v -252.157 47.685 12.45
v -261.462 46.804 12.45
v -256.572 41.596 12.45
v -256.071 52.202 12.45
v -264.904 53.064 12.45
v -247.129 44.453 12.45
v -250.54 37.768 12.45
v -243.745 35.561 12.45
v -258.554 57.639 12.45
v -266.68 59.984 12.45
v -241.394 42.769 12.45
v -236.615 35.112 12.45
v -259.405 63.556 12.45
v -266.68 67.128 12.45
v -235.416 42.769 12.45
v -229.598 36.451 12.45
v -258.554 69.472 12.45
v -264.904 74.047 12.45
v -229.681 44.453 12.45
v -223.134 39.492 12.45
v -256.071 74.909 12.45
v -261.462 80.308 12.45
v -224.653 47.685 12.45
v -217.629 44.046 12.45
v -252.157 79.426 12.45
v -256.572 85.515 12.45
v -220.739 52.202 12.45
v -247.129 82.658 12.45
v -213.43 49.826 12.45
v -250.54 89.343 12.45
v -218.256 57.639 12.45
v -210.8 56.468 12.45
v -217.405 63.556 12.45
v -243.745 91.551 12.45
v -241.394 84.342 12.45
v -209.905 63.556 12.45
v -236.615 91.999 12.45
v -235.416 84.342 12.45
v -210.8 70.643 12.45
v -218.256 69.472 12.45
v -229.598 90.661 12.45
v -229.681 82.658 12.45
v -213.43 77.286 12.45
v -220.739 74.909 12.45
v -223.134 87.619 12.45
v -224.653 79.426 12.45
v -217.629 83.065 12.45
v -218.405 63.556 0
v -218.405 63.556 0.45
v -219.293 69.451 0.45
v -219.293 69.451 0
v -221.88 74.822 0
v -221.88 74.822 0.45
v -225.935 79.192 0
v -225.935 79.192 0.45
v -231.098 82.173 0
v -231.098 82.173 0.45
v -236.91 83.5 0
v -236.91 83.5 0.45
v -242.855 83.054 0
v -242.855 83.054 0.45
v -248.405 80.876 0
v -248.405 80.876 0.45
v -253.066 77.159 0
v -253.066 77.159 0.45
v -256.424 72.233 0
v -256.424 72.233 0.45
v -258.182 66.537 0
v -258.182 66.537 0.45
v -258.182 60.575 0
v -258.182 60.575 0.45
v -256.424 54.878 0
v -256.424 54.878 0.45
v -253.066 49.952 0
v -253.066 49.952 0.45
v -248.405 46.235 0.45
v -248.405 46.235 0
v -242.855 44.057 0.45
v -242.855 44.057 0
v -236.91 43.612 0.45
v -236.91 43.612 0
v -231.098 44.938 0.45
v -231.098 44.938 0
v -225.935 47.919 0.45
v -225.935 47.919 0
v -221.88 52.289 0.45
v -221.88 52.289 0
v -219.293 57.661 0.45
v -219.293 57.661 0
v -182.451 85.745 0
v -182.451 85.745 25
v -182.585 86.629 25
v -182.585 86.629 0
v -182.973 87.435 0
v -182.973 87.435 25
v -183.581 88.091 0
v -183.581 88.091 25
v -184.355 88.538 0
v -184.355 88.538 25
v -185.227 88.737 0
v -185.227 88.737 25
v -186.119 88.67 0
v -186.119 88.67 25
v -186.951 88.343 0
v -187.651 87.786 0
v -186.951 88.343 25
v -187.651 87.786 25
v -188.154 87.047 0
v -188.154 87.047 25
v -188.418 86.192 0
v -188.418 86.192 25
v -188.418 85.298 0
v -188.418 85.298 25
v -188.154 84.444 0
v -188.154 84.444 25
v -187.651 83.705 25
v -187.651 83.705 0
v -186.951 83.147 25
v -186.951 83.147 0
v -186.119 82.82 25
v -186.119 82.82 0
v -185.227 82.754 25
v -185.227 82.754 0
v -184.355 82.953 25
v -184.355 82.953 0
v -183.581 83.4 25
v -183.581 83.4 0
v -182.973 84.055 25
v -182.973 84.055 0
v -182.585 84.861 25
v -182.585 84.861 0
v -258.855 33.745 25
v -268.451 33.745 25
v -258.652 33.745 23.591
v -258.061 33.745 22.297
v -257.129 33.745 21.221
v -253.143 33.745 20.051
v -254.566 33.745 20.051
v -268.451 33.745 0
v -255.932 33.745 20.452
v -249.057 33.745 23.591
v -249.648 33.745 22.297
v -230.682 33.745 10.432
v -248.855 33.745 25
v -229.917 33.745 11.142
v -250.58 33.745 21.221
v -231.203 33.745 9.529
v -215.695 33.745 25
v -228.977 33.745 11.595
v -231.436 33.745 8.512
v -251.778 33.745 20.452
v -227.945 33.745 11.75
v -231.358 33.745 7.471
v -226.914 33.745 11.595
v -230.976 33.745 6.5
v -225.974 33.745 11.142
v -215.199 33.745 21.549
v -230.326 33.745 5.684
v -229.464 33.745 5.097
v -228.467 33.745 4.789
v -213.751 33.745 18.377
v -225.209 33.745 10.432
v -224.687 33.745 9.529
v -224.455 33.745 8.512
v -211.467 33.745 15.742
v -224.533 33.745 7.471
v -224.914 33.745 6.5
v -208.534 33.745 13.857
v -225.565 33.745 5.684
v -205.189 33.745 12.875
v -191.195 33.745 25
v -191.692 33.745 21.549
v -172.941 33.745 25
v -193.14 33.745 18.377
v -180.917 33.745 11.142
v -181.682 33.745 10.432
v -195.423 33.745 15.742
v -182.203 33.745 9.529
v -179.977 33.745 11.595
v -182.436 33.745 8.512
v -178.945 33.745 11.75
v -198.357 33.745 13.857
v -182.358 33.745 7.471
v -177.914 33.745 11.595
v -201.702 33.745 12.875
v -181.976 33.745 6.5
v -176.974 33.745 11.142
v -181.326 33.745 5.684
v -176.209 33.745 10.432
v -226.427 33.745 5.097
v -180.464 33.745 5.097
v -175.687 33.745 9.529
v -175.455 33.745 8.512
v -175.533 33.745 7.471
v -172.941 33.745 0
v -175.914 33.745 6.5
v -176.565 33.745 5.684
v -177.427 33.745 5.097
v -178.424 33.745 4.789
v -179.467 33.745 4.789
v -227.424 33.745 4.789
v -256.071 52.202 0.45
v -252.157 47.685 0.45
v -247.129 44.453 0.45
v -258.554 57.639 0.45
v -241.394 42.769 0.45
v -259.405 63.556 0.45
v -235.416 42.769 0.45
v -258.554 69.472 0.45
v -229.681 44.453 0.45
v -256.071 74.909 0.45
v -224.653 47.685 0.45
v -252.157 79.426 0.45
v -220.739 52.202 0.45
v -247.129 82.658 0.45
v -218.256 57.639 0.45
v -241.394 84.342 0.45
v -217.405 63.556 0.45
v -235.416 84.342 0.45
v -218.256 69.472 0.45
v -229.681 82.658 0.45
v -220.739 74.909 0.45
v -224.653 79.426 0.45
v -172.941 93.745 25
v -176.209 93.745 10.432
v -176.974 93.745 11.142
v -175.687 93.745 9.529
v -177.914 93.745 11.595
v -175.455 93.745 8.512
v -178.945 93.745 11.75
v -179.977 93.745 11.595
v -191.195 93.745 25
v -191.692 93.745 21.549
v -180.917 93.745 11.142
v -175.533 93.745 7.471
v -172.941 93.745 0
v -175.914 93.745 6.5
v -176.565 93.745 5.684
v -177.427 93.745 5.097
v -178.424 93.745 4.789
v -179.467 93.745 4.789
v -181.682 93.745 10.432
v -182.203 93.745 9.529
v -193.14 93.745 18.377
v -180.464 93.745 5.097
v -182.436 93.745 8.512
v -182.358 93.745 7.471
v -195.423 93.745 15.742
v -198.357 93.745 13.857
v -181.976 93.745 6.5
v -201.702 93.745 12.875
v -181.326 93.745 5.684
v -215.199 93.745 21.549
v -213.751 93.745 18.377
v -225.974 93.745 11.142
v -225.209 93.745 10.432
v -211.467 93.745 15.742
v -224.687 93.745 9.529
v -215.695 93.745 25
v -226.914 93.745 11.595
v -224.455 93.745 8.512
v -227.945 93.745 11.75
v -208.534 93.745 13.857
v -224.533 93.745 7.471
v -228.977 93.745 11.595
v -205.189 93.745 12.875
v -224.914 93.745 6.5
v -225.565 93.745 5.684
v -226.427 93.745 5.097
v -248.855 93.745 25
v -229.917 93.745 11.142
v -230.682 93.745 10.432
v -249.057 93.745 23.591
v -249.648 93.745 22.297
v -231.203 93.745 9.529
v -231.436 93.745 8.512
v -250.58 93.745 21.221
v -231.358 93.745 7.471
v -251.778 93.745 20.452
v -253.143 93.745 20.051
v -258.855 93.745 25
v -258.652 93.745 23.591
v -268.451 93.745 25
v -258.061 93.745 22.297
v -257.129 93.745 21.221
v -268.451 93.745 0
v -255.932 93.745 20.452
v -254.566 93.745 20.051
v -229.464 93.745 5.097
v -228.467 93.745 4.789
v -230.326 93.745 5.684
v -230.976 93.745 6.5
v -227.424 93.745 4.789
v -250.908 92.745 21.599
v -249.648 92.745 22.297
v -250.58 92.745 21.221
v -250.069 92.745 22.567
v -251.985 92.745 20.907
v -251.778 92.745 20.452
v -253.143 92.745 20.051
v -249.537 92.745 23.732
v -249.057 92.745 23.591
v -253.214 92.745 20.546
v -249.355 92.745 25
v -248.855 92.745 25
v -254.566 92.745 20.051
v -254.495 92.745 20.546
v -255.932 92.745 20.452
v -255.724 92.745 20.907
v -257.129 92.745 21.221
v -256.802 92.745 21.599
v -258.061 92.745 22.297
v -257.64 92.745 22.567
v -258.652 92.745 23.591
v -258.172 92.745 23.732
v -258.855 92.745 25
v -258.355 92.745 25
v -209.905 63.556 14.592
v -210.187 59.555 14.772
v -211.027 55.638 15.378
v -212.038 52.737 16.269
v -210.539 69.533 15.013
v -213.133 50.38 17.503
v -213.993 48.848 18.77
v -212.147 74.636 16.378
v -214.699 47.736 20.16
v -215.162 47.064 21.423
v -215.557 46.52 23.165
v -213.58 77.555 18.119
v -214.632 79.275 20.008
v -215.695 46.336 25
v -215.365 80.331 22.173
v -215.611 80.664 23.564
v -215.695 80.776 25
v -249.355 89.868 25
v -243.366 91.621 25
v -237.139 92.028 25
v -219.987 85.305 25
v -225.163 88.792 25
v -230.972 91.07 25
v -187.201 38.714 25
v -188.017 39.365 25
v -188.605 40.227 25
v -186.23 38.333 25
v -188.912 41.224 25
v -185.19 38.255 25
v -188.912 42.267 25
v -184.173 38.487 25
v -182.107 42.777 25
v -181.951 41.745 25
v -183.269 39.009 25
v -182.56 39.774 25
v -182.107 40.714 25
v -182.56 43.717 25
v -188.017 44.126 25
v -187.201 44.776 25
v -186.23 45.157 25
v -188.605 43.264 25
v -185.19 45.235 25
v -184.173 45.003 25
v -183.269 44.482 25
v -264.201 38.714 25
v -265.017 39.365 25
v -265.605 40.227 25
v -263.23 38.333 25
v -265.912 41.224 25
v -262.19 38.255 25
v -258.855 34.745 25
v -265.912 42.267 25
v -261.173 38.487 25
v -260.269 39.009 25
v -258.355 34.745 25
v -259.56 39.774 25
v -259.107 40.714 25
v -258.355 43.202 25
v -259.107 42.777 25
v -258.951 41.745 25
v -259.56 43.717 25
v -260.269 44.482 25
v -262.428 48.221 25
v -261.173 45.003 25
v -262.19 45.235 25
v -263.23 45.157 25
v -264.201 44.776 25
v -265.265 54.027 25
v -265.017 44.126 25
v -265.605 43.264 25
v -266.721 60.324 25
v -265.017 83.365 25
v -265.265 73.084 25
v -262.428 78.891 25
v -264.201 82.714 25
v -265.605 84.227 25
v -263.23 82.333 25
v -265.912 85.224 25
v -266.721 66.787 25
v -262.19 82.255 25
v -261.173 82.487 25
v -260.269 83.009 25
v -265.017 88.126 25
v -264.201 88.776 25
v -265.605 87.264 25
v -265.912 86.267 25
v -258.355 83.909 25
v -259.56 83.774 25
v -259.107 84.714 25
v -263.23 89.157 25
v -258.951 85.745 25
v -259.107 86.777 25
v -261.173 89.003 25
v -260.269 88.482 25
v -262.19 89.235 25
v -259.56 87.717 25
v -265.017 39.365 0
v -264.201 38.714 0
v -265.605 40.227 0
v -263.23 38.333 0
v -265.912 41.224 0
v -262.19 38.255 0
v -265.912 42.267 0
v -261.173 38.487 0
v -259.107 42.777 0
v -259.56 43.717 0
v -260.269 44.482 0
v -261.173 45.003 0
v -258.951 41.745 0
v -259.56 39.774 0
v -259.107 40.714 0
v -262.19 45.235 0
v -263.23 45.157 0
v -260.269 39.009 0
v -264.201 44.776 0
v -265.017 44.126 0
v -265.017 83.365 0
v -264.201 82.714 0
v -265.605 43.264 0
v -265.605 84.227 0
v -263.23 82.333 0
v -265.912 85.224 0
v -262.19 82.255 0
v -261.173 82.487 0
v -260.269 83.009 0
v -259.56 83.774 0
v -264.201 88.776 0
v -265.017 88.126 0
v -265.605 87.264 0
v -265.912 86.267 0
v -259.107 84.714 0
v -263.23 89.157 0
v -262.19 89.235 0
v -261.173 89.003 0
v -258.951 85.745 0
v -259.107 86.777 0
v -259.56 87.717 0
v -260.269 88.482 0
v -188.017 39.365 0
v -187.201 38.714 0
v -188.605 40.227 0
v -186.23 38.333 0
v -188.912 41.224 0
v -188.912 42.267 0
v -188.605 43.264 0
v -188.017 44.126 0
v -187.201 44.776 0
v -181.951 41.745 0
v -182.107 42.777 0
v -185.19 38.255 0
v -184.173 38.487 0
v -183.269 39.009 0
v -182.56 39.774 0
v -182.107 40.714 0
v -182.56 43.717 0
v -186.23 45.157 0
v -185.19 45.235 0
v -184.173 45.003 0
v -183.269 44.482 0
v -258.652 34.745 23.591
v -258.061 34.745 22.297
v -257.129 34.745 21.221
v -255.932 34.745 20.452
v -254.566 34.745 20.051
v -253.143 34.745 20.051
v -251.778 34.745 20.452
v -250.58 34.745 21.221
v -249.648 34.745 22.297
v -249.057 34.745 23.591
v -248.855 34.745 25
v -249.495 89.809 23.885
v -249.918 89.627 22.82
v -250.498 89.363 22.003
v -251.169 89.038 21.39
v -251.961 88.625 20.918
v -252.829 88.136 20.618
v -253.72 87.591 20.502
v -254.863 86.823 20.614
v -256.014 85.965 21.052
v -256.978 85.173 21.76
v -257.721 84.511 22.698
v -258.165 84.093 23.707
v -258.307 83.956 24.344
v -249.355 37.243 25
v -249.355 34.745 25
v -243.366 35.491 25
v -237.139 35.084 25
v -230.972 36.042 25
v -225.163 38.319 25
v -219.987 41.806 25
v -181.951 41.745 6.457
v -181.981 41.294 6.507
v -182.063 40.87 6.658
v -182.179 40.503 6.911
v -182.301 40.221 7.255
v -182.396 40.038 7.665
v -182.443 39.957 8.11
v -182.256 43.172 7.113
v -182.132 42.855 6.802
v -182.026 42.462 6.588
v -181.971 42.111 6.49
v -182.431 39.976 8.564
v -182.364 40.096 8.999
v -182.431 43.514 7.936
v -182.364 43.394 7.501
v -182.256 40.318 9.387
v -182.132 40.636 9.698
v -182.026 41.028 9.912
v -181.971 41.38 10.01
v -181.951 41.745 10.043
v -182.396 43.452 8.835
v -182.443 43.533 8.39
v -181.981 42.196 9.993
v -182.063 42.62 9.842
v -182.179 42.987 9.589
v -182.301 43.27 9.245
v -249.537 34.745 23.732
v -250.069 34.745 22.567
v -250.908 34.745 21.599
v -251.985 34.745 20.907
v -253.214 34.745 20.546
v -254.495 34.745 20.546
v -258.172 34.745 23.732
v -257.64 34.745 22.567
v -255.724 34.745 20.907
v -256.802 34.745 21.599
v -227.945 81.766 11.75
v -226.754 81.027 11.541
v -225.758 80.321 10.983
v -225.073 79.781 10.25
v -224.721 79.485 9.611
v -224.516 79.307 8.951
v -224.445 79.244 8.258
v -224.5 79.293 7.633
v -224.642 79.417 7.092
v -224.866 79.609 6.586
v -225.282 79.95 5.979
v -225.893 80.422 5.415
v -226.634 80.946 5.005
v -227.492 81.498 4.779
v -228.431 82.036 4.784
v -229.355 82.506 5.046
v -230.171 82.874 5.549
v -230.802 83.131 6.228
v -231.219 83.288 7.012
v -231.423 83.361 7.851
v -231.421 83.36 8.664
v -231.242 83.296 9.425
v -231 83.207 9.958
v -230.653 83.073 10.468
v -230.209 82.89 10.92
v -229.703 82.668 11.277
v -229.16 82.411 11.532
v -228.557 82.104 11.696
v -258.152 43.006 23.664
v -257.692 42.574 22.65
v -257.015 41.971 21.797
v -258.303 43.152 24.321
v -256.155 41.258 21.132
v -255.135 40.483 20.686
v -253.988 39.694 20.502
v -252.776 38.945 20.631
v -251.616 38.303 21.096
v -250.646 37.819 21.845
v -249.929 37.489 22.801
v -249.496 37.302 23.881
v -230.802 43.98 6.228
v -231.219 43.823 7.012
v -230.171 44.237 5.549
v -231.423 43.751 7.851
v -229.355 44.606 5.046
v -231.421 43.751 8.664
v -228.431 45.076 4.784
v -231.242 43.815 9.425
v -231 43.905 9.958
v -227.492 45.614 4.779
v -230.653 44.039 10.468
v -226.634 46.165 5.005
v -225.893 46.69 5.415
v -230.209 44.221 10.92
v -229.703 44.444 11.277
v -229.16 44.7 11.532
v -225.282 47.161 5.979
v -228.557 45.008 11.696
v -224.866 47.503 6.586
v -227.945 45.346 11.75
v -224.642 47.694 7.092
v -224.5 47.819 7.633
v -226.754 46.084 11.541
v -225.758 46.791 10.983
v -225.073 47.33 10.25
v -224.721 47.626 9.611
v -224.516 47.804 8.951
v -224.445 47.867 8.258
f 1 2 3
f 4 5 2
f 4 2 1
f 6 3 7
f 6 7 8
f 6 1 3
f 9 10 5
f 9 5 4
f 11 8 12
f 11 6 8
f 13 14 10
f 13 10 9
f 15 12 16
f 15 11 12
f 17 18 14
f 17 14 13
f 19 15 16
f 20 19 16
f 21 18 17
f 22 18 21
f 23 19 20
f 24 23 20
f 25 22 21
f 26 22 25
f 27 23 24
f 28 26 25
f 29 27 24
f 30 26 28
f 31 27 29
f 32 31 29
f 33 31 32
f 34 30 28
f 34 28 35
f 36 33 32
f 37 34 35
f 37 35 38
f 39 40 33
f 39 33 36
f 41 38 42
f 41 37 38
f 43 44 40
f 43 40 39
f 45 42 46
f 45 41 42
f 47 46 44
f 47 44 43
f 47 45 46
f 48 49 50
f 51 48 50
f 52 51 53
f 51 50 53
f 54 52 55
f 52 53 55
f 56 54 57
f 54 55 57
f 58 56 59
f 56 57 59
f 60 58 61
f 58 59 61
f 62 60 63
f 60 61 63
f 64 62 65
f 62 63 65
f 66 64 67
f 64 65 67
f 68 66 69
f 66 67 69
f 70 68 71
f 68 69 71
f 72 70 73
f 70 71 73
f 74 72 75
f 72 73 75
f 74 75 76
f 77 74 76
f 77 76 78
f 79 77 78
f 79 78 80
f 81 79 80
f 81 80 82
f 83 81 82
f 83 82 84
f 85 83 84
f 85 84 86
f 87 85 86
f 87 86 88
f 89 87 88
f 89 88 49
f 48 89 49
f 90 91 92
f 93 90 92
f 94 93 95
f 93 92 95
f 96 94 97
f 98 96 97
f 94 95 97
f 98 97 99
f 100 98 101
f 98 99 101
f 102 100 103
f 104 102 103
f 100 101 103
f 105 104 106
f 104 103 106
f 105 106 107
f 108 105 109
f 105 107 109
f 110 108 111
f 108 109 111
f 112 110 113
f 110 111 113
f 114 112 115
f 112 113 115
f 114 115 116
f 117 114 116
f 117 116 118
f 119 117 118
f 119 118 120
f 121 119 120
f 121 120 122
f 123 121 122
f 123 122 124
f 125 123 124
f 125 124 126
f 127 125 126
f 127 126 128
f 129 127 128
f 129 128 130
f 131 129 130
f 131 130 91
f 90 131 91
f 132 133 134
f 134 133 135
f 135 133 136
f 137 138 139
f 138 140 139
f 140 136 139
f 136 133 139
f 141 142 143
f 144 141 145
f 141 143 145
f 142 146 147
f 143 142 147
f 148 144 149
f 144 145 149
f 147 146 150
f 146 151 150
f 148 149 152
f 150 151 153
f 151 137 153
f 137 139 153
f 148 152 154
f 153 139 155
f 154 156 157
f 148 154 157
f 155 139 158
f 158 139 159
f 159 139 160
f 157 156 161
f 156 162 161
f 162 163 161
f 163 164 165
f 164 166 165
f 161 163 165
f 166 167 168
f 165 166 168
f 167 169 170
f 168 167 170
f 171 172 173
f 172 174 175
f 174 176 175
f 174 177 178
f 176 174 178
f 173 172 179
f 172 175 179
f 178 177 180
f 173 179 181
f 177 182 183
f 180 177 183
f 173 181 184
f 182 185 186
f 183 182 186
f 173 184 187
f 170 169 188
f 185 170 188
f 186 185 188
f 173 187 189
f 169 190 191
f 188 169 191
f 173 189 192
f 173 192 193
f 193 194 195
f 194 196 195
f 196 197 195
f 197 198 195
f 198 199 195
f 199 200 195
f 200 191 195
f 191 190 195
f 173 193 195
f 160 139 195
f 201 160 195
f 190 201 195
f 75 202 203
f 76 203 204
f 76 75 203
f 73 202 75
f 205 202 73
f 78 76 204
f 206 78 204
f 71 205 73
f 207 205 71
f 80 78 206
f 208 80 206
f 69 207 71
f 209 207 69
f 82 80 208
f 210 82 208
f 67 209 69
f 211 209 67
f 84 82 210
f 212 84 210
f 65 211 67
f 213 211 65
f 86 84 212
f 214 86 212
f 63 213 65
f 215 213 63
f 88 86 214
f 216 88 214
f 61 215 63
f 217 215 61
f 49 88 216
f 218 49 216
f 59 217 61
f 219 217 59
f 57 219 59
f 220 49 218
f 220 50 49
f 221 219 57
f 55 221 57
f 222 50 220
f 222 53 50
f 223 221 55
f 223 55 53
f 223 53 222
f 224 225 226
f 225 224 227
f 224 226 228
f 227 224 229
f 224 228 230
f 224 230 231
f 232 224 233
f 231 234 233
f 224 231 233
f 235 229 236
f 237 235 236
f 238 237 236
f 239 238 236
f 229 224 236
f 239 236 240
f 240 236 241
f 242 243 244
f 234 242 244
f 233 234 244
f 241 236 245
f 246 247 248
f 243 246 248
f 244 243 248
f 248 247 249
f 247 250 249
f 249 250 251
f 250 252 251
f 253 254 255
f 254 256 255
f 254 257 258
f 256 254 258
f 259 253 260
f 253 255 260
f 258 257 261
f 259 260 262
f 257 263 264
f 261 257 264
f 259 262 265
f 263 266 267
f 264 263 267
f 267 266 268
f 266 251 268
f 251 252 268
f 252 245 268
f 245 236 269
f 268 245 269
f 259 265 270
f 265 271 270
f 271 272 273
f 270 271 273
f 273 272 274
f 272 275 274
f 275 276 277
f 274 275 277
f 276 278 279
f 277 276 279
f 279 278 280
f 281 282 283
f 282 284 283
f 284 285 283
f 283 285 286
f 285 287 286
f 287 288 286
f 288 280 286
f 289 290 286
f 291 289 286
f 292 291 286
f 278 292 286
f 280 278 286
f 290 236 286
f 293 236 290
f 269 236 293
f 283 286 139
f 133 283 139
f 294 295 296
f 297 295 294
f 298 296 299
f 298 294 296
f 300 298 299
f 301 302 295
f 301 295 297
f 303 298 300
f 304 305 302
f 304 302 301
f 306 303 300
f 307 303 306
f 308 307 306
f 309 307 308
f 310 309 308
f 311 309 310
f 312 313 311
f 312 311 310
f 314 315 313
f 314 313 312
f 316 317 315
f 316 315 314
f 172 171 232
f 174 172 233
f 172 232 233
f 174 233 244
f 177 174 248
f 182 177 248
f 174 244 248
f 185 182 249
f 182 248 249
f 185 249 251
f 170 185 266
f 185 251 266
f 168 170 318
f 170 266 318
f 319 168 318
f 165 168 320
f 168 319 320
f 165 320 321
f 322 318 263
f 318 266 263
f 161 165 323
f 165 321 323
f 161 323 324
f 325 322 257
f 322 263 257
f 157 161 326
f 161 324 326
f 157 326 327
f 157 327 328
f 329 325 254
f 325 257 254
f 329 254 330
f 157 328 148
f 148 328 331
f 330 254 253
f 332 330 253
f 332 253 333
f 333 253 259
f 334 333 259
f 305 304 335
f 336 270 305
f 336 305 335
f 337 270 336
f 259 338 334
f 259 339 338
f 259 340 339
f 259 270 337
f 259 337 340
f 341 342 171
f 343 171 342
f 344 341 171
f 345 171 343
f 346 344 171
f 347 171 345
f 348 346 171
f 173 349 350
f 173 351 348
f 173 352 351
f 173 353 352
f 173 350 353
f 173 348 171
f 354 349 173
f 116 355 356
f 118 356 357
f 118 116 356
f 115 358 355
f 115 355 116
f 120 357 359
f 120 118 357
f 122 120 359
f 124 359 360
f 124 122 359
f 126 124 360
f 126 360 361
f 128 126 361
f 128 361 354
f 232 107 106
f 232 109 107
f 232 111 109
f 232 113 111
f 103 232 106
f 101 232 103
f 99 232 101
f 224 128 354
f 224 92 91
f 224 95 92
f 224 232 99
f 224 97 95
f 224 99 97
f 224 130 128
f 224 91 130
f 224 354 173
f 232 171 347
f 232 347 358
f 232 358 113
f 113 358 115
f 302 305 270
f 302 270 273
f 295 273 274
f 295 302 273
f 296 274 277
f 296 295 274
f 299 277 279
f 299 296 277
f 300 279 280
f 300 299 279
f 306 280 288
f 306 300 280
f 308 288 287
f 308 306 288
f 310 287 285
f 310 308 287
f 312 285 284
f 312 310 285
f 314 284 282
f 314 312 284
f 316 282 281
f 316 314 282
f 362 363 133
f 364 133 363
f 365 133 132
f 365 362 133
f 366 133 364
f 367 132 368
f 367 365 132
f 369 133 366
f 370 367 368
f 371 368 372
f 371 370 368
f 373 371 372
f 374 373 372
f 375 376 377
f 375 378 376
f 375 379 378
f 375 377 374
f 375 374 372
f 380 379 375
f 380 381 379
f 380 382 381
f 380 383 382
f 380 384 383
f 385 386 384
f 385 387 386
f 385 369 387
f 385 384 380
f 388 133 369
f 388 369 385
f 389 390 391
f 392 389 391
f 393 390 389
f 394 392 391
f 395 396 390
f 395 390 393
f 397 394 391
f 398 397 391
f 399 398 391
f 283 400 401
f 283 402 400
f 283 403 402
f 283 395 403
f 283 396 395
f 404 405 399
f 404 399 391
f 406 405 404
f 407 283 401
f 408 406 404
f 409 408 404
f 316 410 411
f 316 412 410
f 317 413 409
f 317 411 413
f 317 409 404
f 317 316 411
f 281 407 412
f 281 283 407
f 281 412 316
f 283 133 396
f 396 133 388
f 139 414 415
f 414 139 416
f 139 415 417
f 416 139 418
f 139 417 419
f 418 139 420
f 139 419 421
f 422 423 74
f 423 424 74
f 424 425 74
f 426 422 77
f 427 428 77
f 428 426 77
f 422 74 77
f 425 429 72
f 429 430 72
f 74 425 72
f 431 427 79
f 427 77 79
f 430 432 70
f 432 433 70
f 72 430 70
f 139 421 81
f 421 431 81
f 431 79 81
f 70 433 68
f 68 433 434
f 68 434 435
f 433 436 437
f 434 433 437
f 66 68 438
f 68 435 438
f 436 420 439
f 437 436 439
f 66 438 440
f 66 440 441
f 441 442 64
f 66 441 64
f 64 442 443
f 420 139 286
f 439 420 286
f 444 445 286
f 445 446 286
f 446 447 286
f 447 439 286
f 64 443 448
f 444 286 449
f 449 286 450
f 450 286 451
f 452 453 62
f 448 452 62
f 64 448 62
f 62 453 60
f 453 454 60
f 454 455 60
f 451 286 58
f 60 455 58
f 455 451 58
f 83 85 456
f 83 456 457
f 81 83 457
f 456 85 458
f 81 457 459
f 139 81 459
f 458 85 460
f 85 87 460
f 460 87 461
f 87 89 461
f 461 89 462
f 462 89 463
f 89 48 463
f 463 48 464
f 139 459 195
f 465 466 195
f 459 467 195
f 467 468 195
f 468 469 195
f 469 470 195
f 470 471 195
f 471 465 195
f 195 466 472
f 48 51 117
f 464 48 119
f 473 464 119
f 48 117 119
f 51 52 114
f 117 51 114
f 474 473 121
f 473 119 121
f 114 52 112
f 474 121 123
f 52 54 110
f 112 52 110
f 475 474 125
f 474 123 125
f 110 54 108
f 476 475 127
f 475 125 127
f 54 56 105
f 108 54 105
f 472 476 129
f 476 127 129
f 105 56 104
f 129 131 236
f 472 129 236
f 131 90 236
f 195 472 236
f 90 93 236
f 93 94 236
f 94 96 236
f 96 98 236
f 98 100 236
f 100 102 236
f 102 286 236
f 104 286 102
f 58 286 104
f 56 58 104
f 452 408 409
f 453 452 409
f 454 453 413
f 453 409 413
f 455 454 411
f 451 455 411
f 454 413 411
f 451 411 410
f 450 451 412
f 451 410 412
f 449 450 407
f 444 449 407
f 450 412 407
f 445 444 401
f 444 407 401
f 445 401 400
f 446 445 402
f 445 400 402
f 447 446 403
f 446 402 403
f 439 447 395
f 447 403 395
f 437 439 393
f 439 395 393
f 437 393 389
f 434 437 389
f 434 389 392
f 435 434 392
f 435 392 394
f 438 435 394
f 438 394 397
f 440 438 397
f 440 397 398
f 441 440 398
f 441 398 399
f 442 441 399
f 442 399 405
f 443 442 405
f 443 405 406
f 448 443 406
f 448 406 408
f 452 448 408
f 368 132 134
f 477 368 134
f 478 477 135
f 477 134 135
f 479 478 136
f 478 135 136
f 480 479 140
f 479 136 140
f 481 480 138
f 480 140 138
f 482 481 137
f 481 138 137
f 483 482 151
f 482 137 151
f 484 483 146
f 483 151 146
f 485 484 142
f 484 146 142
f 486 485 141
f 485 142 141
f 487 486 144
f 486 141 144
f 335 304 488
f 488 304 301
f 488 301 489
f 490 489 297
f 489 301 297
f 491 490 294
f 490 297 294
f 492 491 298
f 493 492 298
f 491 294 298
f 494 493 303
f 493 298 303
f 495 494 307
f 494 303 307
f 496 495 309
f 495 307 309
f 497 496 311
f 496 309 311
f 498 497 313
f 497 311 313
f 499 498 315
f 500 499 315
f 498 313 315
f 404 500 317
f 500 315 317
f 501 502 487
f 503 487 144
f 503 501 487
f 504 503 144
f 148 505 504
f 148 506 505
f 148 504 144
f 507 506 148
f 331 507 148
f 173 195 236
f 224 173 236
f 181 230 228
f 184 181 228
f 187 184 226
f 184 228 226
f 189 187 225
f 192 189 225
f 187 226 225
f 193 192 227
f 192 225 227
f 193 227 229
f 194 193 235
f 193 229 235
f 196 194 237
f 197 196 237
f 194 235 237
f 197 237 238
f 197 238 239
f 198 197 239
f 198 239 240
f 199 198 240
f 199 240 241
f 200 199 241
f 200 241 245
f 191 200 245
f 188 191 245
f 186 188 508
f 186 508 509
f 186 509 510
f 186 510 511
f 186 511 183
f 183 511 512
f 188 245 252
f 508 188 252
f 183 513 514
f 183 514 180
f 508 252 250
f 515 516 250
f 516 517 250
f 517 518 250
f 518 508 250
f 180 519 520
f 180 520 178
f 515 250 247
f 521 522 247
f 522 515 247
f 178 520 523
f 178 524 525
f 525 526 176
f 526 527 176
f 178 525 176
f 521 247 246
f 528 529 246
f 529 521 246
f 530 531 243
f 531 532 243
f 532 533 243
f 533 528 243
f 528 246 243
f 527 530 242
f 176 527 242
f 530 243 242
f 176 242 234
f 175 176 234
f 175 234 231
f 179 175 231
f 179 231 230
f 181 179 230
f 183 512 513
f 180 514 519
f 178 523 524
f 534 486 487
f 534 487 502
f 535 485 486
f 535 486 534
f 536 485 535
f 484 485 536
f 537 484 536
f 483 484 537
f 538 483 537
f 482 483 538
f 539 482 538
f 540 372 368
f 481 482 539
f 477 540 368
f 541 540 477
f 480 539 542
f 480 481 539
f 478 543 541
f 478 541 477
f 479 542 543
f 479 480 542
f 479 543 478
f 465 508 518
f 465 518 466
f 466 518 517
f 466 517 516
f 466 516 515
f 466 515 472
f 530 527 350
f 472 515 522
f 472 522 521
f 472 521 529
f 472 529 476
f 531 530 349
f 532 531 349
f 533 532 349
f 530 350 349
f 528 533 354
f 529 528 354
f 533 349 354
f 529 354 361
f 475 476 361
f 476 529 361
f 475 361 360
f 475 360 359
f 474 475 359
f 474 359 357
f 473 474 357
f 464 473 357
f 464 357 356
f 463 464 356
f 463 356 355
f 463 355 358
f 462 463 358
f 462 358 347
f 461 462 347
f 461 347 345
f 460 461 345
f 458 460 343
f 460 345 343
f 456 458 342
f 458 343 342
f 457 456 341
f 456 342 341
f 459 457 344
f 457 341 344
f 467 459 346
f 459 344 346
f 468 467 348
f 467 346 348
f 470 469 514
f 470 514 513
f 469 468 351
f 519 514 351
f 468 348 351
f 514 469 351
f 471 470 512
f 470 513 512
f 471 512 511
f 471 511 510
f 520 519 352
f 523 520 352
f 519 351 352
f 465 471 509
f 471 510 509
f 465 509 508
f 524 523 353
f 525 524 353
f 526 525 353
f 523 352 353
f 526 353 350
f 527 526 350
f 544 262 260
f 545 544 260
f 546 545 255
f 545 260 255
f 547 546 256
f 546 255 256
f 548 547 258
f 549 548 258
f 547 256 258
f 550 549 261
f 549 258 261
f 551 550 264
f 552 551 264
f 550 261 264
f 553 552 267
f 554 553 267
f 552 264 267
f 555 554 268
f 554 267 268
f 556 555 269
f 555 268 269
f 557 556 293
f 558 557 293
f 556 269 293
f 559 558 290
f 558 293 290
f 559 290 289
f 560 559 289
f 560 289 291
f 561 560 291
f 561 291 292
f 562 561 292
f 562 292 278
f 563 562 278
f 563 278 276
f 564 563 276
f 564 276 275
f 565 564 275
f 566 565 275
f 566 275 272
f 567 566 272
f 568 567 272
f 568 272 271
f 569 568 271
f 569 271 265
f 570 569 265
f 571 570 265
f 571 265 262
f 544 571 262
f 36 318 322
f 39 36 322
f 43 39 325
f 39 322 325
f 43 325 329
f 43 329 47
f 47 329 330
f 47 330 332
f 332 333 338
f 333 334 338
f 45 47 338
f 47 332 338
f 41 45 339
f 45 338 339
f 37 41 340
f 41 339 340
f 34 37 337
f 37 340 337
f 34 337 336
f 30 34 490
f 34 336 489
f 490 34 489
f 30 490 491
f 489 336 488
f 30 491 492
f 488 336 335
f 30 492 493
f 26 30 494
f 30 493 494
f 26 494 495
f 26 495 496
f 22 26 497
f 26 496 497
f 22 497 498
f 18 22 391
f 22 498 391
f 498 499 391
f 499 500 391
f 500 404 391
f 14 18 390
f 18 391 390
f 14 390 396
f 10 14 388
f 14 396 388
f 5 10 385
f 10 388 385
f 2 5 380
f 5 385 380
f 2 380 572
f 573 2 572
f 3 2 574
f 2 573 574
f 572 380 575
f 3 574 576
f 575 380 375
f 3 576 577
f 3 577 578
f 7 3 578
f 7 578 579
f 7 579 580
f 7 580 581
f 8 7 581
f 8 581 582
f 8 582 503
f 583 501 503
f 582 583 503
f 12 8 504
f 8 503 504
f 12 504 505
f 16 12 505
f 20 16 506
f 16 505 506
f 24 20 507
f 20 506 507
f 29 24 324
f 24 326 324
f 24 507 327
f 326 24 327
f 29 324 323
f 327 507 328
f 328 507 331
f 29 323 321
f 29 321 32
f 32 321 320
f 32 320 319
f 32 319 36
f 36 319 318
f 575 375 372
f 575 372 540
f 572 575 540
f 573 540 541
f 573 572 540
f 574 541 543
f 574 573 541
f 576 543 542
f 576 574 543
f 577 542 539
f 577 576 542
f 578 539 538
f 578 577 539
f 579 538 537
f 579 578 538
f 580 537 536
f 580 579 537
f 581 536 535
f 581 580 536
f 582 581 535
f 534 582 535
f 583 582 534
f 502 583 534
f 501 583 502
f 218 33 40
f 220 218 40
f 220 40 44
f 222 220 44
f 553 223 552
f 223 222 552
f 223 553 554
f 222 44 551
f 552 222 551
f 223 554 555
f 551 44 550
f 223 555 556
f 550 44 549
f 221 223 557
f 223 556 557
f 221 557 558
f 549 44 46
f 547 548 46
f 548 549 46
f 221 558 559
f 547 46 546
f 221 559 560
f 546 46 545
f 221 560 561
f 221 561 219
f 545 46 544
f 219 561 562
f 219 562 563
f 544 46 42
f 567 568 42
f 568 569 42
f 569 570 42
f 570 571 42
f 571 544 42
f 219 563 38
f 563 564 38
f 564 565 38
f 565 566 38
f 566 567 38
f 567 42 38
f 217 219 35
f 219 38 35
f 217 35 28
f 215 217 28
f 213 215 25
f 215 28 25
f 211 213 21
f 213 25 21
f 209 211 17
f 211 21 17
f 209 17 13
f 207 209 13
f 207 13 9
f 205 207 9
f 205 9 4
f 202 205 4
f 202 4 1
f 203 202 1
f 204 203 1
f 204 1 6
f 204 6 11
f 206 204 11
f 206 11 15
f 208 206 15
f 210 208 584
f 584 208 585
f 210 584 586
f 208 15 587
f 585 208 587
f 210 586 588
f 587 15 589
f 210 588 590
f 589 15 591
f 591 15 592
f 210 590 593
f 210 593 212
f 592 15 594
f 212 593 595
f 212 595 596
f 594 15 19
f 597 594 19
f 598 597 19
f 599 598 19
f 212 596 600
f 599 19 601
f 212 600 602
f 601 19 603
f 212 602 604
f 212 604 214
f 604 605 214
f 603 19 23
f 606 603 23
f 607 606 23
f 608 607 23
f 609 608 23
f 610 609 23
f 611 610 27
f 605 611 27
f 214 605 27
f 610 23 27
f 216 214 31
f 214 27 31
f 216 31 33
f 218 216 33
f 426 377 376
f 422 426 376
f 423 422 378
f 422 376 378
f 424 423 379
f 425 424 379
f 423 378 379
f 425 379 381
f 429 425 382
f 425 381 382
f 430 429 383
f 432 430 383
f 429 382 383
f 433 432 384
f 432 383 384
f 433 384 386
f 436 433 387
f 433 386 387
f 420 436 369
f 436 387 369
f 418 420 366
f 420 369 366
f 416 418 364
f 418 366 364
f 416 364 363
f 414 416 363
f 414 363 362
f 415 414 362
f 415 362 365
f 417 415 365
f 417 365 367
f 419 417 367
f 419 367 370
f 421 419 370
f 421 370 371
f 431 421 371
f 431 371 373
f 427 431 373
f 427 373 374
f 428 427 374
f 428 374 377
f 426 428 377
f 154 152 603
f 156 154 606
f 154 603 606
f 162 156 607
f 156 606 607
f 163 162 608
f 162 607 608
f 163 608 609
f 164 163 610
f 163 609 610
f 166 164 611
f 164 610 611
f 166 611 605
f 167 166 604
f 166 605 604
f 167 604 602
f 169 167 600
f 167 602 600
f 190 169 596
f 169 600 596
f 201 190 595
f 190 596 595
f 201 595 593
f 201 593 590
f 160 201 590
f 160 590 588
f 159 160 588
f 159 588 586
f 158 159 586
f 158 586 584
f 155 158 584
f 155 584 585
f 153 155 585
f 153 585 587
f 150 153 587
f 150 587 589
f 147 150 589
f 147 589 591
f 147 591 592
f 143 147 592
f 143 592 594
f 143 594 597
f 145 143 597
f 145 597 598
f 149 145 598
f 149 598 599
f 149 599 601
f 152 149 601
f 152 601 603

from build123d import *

# Parameters (mm, degrees)
BOSS_EXTRUDE1_DEPTH = 25
SKETCH3_R           = 3.5
SKETCH3_R_2         = 3
CUT_EXTRUDE1_DEPTH  = 30
SKETCH5_R           = 12.25
CUT_EXTRUDE3_DEPTH  = 299.5
SKETCH8_R           = 20
CUT_EXTRUDE6_DEPTH  = 299.5
SKETCH7_R           = 28.5
CUT_EXTRUDE5_DEPTH  = 12.55
SKETCH9_R           = 21
CUT_EXTRUDE7_DEPTH  = 12
SKETCH18_R          = 3.500000003
CUT_EXTRUDE11_DEPTH = 70
SKETCH25_R          = 4.5
CUT_EXTRUDE18_DEPTH = 15
CUT_EXTRUDE19_START = -15
SKETCH26_R          = 4.5
CUT_EXTRUDE19_DEPTH = 15
CUT_EXTRUDE22_DEPTH = 2
CUT_EXTRUDE23_START = -2
CUT_EXTRUDE23_DEPTH = 2


with BuildPart() as part:
    # Sketch2 → Boss-Extrude1 (new body)
    with BuildSketch(Plane.XY):
        Polygon((-180.451457822, 33.745151522), (-172.941457822, 33.745151522), (-172.941457822, 93.745151522), (-268.451457822, 93.745151522), (-268.451457822, 33.745151522), align=None)
    extrude(amount=BOSS_EXTRUDE1_DEPTH)

    # Sketch3 → Cut-Extrude1 (cut)
    with BuildSketch(Plane(origin=(-254.526795804, 25.613966889, 25), x_dir=(1, 0, 0), z_dir=(0, 0, 1))):
        with Locations((-7.924662018, 60.131184633)):
            Circle(SKETCH3_R)
        with Locations((69.075337951, 60.131184633)):
            Circle(SKETCH3_R_2)
        with Locations((69.075337951, 16.131184633)):
            Circle(SKETCH3_R)
        with Locations((-7.924662018, 16.131184633)):
            Circle(SKETCH3_R)
    extrude(amount=-CUT_EXTRUDE1_DEPTH, mode=Mode.SUBTRACT)

    # Sketch5 → Cut-Extrude3 (cut)
    with BuildSketch(Plane(origin=(-254.526795796, 218.819962105, 46.890114798), x_dir=(0, 0, 1), z_dir=(0, 1, 0))):
        with Locations((-21.890114798, 51.081437247)):
            Circle(SKETCH5_R)
    extrude(amount=-CUT_EXTRUDE3_DEPTH, mode=Mode.SUBTRACT)

    # Sketch8 → Cut-Extrude6 (cut)
    with BuildSketch(Plane(origin=(-254.526795804, 25.613966889, 25), x_dir=(1, 0, 0), z_dir=(0, 0, 1))):
        with Locations((16.121848571, 37.941765268)):
            Circle(SKETCH8_R)
    extrude(amount=-CUT_EXTRUDE6_DEPTH, mode=Mode.SUBTRACT)

    # Sketch7 → Cut-Extrude5 (cut)
    with BuildSketch(Plane(origin=(-254.526795804, 25.613966889, 25), x_dir=(1, 0, 0), z_dir=(0, 0, 1))):
        with Locations((16.121848571, 37.941765268)):
            Circle(SKETCH7_R)
    extrude(amount=-CUT_EXTRUDE5_DEPTH, mode=Mode.SUBTRACT)

    # Sketch9 → Cut-Extrude7 (cut)
    with BuildSketch(Plane.XY.offset(12.45)):
        with Locations((-238.404947233, 63.555732157)):
            Circle(SKETCH9_R)
    extrude(amount=-CUT_EXTRUDE7_DEPTH, mode=Mode.SUBTRACT)

    # Sketch18 → Cut-Extrude11 (cut)
    with BuildSketch(Plane(origin=(-155.753430747, 103.745151522, -13.013772077), x_dir=(0, 0, 1), z_dir=(0, 1, 0))):
        with Locations((21.263772077, -72.191927802)):
            Circle(SKETCH18_R)
        with Locations((21.263772077, -23.191927802)):
            Circle(SKETCH18_R)
    extrude(amount=-CUT_EXTRUDE11_DEPTH, mode=Mode.SUBTRACT)

    # Sketch25 → Cut-Extrude18 (cut)
    with BuildSketch(Plane(origin=(-254.526795796, 93.745151522, 46.890114798), x_dir=(0, 0, 1), z_dir=(0, 1, 0))):
        with Locations((-21.890114798, 0.672048442)):
            Circle(SKETCH25_R)
    extrude(amount=-CUT_EXTRUDE18_DEPTH, mode=Mode.SUBTRACT)

    # Sketch26 → Cut-Extrude19 (cut)
    with BuildSketch(Plane(origin=(-254.526795796, 33.745151522, 3.109885202), x_dir=(0, 0, -1), z_dir=(0, -1, 0)).offset(CUT_EXTRUDE19_START)):
        with Locations((-21.890114798, 0.672048442)):
            Circle(SKETCH26_R)
    extrude(amount=CUT_EXTRUDE19_DEPTH, mode=Mode.SUBTRACT)

    # Sketch29 → Cut-Extrude22 (cut)
    with BuildSketch(Plane(origin=(-217.163449612, 32.745151522, 13.13747962), x_dir=(-1, 0, 0), z_dir=(0, -1, 0))):
        with BuildLine():
            ThreePointArc((36.691297742, -16.86252038), (41.691297742, -11.86252038), (36.691297742, -6.86252038))
            ThreePointArc((36.691297742, -6.86252038), (31.691297742, -11.86252038), (36.691297742, -16.86252038))
        make_face()
    extrude(amount=-CUT_EXTRUDE22_DEPTH, mode=Mode.SUBTRACT)

    # Sketch30 → Cut-Extrude23 (cut)
    with BuildSketch(Plane(origin=(-217.163449612, 94.745151522, 36.86252038), x_dir=(-1, 0, 0), z_dir=(0, 1, 0)).offset(CUT_EXTRUDE23_START)):
        with BuildLine():
            ThreePointArc((36.691297742, -16.86252038), (41.691297742, -11.86252038), (36.691297742, -6.86252038))
            ThreePointArc((36.691297742, -6.86252038), (31.691297742, -11.86252038), (36.691297742, -16.86252038))
        make_face()
    extrude(amount=CUT_EXTRUDE23_DEPTH, mode=Mode.SUBTRACT)


solid = part.part
